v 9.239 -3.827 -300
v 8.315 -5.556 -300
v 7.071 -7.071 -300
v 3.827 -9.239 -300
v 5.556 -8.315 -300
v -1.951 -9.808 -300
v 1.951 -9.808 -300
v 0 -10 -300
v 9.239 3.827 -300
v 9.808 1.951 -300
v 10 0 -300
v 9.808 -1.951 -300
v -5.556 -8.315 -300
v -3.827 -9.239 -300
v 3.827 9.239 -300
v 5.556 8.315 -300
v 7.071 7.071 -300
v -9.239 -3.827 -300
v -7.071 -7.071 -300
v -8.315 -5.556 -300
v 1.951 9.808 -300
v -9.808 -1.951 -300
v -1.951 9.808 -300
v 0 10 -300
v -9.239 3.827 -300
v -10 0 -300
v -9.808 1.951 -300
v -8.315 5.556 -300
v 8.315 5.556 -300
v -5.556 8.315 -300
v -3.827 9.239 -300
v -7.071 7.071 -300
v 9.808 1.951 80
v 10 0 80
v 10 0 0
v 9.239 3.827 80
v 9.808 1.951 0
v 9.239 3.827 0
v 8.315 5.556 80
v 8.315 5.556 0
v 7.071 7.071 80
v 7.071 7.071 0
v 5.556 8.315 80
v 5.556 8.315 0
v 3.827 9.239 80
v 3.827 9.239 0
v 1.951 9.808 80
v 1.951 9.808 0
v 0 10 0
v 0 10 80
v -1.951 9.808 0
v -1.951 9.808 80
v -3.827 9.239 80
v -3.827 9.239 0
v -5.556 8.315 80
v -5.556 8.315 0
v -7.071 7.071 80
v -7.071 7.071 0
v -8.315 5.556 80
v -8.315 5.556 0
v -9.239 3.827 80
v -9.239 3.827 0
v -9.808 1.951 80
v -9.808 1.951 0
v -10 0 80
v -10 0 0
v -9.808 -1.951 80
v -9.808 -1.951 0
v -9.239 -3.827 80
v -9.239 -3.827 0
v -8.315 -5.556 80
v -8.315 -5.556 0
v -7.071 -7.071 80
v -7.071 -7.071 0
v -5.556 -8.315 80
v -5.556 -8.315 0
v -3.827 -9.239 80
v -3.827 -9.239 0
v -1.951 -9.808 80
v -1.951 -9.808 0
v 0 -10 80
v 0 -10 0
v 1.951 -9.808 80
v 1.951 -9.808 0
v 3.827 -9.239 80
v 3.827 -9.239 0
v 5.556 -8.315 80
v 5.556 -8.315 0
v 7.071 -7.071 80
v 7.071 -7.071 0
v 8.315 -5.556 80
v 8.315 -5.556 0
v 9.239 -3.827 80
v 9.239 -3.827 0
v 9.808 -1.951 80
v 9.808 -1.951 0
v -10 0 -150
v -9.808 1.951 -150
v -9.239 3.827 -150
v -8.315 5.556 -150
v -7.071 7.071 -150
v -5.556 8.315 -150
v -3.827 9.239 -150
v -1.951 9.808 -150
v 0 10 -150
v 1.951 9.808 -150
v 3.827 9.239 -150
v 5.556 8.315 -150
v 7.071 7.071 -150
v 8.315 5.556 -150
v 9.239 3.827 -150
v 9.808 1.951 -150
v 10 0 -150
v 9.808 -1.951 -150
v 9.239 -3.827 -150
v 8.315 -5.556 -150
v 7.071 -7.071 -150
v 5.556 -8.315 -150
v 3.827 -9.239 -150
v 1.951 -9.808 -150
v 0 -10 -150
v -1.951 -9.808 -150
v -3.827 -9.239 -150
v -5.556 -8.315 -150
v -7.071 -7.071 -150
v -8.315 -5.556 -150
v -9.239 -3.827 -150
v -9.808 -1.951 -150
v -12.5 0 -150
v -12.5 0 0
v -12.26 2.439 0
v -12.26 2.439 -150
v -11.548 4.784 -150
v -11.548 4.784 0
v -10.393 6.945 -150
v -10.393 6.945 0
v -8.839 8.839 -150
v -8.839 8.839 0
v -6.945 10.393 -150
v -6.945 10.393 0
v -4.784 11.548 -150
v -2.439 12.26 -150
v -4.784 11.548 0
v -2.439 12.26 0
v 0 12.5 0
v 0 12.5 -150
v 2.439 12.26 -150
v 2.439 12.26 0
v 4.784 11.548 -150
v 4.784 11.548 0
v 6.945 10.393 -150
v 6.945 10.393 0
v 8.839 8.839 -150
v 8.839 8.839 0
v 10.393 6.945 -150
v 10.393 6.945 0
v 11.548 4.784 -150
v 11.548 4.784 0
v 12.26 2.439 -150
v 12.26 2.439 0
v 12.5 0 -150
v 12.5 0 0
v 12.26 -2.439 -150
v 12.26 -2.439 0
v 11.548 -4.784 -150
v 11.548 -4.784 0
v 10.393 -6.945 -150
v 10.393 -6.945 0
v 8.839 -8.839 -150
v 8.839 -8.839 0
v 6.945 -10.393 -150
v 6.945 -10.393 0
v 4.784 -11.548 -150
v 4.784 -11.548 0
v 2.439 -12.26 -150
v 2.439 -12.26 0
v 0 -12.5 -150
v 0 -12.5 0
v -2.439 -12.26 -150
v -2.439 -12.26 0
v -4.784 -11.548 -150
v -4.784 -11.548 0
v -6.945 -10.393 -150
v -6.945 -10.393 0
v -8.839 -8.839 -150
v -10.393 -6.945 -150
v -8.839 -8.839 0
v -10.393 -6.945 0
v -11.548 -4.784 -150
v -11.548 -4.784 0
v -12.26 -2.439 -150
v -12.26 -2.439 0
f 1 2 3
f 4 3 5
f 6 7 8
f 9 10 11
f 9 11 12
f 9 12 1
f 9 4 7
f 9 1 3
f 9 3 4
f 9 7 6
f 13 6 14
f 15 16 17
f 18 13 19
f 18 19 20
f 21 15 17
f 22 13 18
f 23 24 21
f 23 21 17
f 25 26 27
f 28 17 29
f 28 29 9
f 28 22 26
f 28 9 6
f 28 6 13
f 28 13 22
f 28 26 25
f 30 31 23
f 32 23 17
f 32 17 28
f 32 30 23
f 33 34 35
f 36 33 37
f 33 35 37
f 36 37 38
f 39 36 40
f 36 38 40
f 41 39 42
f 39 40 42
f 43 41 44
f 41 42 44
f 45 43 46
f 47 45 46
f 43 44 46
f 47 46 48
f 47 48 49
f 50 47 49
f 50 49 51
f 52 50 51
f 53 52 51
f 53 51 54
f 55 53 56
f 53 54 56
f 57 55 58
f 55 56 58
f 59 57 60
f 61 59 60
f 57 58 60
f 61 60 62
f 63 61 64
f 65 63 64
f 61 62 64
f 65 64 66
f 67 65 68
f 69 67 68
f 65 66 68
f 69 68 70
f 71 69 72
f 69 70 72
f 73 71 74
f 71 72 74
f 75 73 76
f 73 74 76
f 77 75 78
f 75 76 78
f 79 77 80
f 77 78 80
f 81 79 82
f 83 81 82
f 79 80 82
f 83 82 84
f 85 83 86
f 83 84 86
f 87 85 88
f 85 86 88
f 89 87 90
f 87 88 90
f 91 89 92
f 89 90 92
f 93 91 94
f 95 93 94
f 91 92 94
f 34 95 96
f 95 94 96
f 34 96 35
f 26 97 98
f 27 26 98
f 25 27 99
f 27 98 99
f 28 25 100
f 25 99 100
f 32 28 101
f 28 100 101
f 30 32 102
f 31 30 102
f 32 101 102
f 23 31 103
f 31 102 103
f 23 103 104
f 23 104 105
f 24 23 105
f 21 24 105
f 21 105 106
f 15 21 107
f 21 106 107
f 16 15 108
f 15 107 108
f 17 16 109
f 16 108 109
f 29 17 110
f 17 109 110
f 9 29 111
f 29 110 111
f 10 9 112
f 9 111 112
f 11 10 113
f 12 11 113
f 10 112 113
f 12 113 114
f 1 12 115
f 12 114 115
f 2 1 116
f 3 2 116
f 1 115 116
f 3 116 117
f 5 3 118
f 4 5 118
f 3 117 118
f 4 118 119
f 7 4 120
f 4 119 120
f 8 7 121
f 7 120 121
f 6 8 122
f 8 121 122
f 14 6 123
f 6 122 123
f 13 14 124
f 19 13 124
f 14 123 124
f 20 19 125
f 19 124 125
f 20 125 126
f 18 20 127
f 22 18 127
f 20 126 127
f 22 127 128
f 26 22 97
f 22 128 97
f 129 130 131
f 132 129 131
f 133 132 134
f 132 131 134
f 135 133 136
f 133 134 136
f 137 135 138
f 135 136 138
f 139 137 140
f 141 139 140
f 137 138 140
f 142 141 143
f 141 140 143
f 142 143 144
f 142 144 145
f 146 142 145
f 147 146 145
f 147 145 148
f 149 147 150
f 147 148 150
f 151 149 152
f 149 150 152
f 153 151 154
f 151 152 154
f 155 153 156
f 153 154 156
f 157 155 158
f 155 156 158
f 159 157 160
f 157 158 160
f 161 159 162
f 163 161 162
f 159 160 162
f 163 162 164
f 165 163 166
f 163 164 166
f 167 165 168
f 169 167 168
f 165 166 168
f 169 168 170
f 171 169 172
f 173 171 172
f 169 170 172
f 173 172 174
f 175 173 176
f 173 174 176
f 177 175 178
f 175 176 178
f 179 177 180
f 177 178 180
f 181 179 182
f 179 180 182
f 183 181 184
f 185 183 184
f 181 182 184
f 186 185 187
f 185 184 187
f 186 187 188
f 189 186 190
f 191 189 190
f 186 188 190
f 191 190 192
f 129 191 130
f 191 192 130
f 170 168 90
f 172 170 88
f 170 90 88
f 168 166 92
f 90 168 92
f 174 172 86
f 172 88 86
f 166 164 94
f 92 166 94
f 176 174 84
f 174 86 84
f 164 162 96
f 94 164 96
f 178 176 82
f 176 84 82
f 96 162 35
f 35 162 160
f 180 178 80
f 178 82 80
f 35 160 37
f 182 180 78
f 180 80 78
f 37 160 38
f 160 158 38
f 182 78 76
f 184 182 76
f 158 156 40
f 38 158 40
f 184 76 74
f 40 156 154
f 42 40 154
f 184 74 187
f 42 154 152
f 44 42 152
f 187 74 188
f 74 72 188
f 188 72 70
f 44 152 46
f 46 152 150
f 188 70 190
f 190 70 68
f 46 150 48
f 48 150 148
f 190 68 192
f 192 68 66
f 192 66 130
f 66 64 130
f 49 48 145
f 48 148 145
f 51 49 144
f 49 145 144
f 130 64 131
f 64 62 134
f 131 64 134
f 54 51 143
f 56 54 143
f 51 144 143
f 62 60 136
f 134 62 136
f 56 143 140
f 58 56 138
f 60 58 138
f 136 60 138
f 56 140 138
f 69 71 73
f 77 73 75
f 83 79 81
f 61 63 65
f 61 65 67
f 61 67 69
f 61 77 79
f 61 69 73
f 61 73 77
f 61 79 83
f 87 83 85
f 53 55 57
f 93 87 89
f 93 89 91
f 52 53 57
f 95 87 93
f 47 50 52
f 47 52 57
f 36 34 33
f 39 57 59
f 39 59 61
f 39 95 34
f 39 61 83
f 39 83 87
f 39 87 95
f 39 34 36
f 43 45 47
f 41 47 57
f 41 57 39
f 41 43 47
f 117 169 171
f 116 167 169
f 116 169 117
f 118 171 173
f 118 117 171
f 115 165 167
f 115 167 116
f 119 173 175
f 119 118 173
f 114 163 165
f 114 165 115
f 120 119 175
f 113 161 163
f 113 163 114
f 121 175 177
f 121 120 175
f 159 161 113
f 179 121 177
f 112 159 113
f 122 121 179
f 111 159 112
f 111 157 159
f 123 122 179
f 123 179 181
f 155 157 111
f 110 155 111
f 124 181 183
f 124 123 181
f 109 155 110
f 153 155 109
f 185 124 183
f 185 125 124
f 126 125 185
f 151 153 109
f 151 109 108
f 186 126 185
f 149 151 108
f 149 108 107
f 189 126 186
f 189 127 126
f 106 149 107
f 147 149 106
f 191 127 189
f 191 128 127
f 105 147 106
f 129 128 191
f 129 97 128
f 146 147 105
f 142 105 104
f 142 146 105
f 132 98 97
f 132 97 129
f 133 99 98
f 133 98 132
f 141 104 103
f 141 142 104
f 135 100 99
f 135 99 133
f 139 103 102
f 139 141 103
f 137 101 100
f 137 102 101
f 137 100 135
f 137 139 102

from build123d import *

# Parameters (mm, degrees)
CROQUIS1_R              = 10
SALIENTE_EXTRUIR1_DEPTH = 80
CROQUIS2_R              = 12.5
SALIENTE_EXTRUIR2_DEPTH = 150
CROQUIS3_R              = 10
SALIENTE_EXTRUIR3_DEPTH = 150


with BuildPart() as part:
    # Croquis1 → Saliente-Extruir1 (new body)
    with BuildSketch(Plane.XY):
        Circle(CROQUIS1_R)
    extrude(amount=SALIENTE_EXTRUIR1_DEPTH)

    # Croquis2 → Saliente-Extruir2 (add)
    with BuildSketch(Plane(origin=(0, 0, 0), x_dir=(-1, 0, 0), z_dir=(0, 0, -1))):
        Circle(CROQUIS2_R)
    extrude(amount=SALIENTE_EXTRUIR2_DEPTH)

    # Croquis3 → Saliente-Extruir3 (add)
    with BuildSketch(Plane(origin=(0, 0, -150), x_dir=(-1, 0, 0), z_dir=(0, 0, -1))):
        Circle(CROQUIS3_R)
    extrude(amount=SALIENTE_EXTRUIR3_DEPTH)


solid = part.part
